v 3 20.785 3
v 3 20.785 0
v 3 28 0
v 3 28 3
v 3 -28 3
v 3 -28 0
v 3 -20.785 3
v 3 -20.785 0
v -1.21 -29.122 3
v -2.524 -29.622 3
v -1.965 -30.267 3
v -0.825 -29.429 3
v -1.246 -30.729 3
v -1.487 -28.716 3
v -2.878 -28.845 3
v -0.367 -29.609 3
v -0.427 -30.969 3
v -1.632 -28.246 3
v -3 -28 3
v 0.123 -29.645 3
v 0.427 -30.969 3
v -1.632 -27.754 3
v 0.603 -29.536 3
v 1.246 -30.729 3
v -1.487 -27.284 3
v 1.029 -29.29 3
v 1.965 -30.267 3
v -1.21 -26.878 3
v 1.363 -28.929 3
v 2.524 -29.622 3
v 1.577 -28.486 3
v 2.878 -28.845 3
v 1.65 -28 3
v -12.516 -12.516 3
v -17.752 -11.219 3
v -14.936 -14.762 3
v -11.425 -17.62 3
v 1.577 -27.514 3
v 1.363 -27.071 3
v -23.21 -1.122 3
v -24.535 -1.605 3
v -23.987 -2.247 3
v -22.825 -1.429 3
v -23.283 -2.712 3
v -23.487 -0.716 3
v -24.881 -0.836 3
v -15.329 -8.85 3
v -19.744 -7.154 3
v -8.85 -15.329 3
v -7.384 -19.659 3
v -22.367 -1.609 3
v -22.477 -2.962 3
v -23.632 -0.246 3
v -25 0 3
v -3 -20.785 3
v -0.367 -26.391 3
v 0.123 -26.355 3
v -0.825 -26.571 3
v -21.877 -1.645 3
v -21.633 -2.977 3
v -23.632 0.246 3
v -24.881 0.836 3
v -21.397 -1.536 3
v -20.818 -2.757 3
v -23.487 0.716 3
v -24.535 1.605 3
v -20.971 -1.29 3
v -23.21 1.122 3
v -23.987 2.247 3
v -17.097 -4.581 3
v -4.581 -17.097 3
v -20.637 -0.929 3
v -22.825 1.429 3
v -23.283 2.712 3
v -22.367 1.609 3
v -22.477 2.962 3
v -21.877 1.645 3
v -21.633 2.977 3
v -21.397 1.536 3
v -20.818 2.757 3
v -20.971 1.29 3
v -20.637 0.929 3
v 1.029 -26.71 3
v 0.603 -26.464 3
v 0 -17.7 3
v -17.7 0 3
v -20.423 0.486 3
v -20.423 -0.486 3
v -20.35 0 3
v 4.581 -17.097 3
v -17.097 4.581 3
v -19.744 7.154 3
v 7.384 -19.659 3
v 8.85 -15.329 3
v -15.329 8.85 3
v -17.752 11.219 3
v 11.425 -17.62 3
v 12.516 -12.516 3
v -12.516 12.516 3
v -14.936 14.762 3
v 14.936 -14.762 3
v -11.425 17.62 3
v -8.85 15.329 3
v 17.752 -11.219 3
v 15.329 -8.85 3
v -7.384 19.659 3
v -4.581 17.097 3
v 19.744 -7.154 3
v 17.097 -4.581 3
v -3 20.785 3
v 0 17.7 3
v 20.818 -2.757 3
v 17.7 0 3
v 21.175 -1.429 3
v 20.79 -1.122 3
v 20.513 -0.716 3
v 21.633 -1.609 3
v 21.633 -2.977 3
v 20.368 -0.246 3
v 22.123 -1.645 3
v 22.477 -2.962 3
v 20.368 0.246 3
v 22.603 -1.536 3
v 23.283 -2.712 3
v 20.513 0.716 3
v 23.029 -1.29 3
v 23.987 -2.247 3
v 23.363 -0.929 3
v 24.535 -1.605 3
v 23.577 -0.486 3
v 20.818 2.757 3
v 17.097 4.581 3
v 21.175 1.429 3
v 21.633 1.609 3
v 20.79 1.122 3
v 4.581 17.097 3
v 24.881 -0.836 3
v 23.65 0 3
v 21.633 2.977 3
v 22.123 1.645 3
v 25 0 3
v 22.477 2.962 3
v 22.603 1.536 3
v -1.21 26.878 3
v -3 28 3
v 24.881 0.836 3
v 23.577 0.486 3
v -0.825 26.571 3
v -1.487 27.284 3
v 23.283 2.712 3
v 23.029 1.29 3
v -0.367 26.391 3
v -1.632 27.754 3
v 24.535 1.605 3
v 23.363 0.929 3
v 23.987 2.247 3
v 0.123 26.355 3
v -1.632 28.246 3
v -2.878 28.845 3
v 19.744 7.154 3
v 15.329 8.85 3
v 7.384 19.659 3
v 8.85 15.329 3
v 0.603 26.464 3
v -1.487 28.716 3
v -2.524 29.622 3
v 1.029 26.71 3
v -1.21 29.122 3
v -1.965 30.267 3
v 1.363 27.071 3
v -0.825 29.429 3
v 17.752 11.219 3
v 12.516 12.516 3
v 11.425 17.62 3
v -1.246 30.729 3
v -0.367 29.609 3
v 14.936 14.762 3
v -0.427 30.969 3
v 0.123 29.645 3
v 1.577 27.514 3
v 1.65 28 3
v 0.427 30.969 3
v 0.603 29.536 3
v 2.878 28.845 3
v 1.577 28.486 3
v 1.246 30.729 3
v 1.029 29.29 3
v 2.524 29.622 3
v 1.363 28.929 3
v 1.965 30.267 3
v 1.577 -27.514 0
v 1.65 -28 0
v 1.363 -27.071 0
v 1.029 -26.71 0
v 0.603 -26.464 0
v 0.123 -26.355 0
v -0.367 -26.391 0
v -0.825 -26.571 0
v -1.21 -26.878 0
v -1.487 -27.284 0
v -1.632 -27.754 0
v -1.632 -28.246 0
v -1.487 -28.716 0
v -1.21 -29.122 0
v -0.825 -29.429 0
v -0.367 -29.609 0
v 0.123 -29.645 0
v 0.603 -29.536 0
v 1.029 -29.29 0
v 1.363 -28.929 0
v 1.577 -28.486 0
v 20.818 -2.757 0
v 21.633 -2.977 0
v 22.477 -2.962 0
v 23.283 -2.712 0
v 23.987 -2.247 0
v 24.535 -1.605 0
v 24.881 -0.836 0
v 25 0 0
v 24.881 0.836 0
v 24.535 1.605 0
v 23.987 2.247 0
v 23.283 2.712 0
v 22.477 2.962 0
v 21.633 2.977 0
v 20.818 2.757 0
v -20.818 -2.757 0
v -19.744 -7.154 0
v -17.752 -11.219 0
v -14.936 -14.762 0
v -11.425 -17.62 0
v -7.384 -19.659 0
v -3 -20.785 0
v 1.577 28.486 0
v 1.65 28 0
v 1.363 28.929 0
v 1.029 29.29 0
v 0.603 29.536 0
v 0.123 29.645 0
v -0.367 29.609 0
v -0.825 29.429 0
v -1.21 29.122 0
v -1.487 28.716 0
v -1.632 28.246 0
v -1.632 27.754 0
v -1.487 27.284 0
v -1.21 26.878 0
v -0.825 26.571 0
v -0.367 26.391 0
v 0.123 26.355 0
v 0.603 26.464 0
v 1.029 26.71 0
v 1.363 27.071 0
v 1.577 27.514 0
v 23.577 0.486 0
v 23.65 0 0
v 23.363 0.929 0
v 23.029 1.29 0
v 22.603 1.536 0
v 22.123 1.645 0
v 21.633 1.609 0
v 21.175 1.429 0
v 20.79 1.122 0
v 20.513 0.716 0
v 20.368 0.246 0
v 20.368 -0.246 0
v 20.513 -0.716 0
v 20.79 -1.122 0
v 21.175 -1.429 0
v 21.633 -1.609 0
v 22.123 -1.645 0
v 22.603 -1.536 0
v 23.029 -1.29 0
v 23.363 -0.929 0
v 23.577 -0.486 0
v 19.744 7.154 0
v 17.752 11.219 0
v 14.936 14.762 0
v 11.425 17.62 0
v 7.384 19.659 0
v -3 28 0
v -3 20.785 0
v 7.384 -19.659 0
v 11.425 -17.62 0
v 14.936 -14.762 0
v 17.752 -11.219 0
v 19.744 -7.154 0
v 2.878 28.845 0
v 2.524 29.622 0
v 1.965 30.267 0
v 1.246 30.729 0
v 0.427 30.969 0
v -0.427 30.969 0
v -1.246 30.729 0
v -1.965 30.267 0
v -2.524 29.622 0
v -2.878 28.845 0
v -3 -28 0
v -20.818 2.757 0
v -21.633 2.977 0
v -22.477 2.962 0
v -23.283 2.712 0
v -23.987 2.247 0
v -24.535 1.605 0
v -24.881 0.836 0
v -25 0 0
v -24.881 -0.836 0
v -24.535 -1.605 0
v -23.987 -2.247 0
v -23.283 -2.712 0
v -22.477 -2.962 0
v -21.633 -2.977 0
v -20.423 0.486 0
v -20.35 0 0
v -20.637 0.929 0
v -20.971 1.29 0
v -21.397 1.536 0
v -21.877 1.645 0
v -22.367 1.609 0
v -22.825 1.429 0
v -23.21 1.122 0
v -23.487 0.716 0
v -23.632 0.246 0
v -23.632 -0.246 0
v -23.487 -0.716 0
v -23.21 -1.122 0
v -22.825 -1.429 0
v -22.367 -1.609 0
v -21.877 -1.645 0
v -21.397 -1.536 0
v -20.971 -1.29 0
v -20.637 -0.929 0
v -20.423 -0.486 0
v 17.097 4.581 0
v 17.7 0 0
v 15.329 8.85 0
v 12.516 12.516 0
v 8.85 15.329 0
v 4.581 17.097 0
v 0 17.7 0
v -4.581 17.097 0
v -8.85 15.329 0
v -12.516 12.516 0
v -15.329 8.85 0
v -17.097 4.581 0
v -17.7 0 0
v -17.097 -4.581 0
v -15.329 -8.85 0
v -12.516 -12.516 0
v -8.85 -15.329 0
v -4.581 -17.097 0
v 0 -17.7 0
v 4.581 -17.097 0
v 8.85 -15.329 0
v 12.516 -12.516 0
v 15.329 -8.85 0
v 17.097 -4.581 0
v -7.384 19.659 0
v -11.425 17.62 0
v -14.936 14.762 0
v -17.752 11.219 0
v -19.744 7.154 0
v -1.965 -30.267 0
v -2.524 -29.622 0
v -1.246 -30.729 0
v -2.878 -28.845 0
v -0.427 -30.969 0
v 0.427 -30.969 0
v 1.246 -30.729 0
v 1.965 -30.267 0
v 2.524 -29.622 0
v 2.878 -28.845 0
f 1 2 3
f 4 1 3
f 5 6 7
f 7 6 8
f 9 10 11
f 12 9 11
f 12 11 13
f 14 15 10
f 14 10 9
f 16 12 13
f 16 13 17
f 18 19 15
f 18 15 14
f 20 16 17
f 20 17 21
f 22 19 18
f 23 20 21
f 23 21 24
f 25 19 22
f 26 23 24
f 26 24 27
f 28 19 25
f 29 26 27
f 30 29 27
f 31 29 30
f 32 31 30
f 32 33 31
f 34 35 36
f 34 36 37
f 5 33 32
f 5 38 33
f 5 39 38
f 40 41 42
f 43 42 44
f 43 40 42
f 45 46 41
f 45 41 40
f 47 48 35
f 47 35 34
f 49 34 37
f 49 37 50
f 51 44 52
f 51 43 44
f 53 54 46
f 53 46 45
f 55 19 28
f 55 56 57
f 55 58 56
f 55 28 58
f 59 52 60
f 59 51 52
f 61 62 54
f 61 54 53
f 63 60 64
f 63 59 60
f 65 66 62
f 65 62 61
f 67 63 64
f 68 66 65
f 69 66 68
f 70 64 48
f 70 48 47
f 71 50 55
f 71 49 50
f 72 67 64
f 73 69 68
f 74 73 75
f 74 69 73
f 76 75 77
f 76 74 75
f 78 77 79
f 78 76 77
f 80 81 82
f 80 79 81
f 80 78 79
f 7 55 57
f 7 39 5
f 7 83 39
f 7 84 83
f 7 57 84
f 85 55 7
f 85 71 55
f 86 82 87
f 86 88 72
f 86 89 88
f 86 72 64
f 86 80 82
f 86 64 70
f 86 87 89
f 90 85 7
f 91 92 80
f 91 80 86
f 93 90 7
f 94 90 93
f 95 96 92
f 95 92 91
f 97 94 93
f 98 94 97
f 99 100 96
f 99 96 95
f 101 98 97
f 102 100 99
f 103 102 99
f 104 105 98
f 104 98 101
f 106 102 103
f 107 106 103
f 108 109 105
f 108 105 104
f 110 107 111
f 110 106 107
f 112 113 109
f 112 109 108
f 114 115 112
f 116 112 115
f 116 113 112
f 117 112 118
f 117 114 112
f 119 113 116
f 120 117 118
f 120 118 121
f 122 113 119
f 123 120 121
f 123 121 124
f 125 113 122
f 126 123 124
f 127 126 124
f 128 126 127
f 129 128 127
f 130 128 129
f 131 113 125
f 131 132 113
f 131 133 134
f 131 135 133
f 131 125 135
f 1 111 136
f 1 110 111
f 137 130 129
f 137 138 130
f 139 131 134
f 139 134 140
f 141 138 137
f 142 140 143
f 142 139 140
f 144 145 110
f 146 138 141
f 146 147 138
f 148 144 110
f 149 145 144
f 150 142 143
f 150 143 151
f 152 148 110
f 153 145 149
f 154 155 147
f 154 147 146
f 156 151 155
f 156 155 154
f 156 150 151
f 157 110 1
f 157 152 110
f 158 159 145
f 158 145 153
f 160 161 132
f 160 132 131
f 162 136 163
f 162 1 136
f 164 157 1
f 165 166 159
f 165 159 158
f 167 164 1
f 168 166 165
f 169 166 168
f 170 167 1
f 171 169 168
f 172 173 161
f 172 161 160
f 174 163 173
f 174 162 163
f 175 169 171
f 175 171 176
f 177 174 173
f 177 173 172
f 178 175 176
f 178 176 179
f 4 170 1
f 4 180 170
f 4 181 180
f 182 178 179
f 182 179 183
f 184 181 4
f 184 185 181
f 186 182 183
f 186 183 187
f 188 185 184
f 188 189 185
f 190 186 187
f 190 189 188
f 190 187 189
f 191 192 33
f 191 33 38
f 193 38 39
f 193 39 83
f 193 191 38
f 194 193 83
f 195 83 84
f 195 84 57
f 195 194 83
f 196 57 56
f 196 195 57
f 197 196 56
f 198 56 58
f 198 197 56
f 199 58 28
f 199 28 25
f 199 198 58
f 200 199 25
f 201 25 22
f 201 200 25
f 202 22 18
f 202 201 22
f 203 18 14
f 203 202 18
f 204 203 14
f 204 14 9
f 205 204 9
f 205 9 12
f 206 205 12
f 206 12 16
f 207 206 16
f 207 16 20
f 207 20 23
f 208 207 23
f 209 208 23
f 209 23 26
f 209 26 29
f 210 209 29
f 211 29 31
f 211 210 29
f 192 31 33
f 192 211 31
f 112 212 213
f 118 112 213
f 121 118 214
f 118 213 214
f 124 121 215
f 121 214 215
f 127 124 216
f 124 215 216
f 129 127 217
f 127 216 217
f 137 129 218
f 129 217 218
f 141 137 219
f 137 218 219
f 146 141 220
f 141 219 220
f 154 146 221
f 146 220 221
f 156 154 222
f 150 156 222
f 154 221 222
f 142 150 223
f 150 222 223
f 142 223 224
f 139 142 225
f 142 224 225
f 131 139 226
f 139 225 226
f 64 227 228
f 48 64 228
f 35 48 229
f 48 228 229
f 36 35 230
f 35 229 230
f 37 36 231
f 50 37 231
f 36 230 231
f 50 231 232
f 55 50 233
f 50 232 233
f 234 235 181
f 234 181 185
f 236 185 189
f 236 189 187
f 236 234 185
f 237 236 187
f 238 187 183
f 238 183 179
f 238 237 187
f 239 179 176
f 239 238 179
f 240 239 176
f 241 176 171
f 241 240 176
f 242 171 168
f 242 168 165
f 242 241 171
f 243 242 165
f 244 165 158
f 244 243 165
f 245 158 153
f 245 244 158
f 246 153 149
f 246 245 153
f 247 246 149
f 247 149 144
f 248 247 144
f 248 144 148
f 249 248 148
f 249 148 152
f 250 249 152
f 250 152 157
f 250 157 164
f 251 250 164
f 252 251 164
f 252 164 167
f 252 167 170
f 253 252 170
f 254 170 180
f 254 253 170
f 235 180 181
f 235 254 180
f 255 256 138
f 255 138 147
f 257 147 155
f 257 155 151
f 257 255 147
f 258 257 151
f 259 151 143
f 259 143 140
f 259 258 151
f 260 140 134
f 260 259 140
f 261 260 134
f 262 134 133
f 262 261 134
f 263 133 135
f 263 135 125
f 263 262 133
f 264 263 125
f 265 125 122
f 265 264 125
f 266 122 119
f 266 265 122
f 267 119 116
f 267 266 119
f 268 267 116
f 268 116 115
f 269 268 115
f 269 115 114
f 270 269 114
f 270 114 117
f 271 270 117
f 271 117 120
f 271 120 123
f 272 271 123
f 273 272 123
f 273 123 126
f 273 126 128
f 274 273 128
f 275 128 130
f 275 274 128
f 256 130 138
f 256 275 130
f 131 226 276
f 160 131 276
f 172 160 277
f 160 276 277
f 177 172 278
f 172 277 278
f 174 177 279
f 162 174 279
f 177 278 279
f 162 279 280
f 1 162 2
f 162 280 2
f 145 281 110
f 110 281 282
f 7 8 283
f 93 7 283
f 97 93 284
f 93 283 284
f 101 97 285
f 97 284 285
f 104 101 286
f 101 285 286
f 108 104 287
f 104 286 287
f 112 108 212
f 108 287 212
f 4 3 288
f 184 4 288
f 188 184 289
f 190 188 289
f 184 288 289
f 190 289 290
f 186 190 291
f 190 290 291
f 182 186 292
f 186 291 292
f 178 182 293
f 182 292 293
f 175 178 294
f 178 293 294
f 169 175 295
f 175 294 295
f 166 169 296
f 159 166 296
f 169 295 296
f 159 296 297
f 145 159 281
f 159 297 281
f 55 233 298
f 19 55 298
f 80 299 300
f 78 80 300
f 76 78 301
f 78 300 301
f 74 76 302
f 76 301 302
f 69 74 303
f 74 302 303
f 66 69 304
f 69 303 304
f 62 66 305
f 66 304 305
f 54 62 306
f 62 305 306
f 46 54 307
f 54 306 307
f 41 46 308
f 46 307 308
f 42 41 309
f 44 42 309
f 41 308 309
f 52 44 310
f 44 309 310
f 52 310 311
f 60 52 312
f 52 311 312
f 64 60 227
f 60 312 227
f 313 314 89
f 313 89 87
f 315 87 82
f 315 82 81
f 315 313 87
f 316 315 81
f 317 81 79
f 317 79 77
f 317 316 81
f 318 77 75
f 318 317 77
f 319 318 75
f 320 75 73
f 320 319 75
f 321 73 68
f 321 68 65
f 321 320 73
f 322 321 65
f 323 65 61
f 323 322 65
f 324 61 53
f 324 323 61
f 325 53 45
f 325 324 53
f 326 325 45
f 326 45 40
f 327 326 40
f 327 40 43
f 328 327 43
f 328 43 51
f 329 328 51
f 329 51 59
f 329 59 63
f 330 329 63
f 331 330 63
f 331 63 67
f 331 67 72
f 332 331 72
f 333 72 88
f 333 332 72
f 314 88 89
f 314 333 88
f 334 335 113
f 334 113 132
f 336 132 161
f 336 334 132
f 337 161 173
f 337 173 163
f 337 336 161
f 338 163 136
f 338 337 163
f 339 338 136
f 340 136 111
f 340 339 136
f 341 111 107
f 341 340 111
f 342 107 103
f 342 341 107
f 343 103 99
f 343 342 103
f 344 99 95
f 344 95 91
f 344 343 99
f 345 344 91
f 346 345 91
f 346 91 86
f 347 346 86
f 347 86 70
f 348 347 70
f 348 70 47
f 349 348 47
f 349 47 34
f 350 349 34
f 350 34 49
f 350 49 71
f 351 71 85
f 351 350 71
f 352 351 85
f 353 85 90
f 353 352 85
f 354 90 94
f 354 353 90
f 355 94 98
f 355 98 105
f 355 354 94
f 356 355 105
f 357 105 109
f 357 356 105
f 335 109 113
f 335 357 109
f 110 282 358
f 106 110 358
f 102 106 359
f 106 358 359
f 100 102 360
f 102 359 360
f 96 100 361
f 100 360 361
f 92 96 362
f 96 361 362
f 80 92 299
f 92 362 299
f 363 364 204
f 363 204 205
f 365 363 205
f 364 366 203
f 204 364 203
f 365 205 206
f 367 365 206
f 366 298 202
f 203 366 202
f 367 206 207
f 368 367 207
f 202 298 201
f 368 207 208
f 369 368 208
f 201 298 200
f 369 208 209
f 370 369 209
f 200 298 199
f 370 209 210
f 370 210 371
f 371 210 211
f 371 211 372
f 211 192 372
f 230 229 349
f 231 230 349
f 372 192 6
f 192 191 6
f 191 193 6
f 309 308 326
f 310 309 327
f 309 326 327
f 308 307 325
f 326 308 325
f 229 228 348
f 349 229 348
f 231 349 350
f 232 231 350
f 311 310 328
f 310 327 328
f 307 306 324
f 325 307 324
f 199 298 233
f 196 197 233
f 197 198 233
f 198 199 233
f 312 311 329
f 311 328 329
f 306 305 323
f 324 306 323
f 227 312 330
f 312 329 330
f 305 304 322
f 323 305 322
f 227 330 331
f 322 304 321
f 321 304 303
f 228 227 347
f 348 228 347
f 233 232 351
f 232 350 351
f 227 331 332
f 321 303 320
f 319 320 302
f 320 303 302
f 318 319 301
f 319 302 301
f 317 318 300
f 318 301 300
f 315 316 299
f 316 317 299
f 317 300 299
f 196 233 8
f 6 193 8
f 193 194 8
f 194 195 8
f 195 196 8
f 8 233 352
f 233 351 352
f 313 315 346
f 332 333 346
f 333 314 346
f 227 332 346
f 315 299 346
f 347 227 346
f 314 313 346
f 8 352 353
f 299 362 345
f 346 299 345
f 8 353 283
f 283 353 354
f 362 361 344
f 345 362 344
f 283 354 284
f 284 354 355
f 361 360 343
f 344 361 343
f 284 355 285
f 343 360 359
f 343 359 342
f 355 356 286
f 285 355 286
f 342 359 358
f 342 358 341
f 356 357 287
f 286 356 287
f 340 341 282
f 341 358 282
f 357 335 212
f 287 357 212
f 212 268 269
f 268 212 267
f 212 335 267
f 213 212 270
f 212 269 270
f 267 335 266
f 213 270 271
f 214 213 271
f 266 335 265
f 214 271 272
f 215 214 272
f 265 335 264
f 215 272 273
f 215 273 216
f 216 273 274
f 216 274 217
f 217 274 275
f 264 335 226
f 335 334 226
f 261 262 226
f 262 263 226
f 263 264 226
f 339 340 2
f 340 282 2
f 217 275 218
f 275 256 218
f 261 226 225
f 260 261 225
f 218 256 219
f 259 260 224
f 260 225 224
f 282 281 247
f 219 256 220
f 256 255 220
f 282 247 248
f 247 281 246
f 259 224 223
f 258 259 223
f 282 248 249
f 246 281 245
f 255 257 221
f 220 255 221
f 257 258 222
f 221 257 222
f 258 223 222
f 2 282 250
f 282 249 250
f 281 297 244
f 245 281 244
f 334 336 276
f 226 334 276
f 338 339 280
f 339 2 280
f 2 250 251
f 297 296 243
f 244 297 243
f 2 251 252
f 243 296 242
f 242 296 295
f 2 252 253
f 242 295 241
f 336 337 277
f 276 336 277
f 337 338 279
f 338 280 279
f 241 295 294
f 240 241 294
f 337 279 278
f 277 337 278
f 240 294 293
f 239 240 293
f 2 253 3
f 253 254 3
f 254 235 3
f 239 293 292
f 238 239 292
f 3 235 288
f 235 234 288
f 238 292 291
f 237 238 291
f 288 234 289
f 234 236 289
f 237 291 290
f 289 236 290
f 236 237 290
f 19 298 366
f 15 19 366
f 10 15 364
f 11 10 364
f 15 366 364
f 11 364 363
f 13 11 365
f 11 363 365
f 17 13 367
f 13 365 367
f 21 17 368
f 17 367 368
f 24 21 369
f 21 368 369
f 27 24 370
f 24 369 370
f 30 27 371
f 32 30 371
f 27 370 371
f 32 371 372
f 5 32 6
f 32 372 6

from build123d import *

# Parameters (mm, degrees)
SKETCH_1_R      = 1.65
SKETCH_1_R_2    = 17.7
EXTRUDE_1_DEPTH = 3


with BuildPart() as part:
    # 草图1 → 凸台-拉伸1 (new body)
    with BuildSketch(Plane.XY):
        with BuildLine():
            Line((3, 20.784609691), (3, 28))
            ThreePointArc((3, 28), (0, 31), (-3, 28))
            Line((-3, 28), (-3, 20.784609691))
            ThreePointArc((-3, 20.784609691), (-14.935576159, 14.762403761), (-20.818181818, 2.757409252))
            ThreePointArc((-20.818181818, 2.757409252), (-25, 0), (-20.818181818, -2.757409252))
            ThreePointArc((-20.818181818, -2.757409252), (-14.935576159, -14.762403761), (-3, -20.784609691))
            Line((-3, -20.784609691), (-3, -28))
            ThreePointArc((-3, -28), (0, -31), (3, -28))
            Line((3, -28), (3, -20.784609691))
            ThreePointArc((3, -20.784609691), (14.935576159, -14.762403761), (20.818181818, -2.757409252))
            ThreePointArc((20.818181818, -2.757409252), (25, 0), (20.818181818, 2.757409252))
            ThreePointArc((20.818181818, 2.757409252), (14.935576159, 14.762403761), (3, 20.784609691))
        make_face()
        with Locations((0, 28)):
            Circle(SKETCH_1_R, mode=Mode.SUBTRACT)
        Circle(SKETCH_1_R_2, mode=Mode.SUBTRACT)
        with Locations((-22, 0)):
            Circle(SKETCH_1_R, mode=Mode.SUBTRACT)
        with Locations((22, 0)):
            Circle(SKETCH_1_R, mode=Mode.SUBTRACT)
        with Locations((0, -28)):
            Circle(SKETCH_1_R, mode=Mode.SUBTRACT)
    extrude(amount=EXTRUDE_1_DEPTH)


solid = part.part
